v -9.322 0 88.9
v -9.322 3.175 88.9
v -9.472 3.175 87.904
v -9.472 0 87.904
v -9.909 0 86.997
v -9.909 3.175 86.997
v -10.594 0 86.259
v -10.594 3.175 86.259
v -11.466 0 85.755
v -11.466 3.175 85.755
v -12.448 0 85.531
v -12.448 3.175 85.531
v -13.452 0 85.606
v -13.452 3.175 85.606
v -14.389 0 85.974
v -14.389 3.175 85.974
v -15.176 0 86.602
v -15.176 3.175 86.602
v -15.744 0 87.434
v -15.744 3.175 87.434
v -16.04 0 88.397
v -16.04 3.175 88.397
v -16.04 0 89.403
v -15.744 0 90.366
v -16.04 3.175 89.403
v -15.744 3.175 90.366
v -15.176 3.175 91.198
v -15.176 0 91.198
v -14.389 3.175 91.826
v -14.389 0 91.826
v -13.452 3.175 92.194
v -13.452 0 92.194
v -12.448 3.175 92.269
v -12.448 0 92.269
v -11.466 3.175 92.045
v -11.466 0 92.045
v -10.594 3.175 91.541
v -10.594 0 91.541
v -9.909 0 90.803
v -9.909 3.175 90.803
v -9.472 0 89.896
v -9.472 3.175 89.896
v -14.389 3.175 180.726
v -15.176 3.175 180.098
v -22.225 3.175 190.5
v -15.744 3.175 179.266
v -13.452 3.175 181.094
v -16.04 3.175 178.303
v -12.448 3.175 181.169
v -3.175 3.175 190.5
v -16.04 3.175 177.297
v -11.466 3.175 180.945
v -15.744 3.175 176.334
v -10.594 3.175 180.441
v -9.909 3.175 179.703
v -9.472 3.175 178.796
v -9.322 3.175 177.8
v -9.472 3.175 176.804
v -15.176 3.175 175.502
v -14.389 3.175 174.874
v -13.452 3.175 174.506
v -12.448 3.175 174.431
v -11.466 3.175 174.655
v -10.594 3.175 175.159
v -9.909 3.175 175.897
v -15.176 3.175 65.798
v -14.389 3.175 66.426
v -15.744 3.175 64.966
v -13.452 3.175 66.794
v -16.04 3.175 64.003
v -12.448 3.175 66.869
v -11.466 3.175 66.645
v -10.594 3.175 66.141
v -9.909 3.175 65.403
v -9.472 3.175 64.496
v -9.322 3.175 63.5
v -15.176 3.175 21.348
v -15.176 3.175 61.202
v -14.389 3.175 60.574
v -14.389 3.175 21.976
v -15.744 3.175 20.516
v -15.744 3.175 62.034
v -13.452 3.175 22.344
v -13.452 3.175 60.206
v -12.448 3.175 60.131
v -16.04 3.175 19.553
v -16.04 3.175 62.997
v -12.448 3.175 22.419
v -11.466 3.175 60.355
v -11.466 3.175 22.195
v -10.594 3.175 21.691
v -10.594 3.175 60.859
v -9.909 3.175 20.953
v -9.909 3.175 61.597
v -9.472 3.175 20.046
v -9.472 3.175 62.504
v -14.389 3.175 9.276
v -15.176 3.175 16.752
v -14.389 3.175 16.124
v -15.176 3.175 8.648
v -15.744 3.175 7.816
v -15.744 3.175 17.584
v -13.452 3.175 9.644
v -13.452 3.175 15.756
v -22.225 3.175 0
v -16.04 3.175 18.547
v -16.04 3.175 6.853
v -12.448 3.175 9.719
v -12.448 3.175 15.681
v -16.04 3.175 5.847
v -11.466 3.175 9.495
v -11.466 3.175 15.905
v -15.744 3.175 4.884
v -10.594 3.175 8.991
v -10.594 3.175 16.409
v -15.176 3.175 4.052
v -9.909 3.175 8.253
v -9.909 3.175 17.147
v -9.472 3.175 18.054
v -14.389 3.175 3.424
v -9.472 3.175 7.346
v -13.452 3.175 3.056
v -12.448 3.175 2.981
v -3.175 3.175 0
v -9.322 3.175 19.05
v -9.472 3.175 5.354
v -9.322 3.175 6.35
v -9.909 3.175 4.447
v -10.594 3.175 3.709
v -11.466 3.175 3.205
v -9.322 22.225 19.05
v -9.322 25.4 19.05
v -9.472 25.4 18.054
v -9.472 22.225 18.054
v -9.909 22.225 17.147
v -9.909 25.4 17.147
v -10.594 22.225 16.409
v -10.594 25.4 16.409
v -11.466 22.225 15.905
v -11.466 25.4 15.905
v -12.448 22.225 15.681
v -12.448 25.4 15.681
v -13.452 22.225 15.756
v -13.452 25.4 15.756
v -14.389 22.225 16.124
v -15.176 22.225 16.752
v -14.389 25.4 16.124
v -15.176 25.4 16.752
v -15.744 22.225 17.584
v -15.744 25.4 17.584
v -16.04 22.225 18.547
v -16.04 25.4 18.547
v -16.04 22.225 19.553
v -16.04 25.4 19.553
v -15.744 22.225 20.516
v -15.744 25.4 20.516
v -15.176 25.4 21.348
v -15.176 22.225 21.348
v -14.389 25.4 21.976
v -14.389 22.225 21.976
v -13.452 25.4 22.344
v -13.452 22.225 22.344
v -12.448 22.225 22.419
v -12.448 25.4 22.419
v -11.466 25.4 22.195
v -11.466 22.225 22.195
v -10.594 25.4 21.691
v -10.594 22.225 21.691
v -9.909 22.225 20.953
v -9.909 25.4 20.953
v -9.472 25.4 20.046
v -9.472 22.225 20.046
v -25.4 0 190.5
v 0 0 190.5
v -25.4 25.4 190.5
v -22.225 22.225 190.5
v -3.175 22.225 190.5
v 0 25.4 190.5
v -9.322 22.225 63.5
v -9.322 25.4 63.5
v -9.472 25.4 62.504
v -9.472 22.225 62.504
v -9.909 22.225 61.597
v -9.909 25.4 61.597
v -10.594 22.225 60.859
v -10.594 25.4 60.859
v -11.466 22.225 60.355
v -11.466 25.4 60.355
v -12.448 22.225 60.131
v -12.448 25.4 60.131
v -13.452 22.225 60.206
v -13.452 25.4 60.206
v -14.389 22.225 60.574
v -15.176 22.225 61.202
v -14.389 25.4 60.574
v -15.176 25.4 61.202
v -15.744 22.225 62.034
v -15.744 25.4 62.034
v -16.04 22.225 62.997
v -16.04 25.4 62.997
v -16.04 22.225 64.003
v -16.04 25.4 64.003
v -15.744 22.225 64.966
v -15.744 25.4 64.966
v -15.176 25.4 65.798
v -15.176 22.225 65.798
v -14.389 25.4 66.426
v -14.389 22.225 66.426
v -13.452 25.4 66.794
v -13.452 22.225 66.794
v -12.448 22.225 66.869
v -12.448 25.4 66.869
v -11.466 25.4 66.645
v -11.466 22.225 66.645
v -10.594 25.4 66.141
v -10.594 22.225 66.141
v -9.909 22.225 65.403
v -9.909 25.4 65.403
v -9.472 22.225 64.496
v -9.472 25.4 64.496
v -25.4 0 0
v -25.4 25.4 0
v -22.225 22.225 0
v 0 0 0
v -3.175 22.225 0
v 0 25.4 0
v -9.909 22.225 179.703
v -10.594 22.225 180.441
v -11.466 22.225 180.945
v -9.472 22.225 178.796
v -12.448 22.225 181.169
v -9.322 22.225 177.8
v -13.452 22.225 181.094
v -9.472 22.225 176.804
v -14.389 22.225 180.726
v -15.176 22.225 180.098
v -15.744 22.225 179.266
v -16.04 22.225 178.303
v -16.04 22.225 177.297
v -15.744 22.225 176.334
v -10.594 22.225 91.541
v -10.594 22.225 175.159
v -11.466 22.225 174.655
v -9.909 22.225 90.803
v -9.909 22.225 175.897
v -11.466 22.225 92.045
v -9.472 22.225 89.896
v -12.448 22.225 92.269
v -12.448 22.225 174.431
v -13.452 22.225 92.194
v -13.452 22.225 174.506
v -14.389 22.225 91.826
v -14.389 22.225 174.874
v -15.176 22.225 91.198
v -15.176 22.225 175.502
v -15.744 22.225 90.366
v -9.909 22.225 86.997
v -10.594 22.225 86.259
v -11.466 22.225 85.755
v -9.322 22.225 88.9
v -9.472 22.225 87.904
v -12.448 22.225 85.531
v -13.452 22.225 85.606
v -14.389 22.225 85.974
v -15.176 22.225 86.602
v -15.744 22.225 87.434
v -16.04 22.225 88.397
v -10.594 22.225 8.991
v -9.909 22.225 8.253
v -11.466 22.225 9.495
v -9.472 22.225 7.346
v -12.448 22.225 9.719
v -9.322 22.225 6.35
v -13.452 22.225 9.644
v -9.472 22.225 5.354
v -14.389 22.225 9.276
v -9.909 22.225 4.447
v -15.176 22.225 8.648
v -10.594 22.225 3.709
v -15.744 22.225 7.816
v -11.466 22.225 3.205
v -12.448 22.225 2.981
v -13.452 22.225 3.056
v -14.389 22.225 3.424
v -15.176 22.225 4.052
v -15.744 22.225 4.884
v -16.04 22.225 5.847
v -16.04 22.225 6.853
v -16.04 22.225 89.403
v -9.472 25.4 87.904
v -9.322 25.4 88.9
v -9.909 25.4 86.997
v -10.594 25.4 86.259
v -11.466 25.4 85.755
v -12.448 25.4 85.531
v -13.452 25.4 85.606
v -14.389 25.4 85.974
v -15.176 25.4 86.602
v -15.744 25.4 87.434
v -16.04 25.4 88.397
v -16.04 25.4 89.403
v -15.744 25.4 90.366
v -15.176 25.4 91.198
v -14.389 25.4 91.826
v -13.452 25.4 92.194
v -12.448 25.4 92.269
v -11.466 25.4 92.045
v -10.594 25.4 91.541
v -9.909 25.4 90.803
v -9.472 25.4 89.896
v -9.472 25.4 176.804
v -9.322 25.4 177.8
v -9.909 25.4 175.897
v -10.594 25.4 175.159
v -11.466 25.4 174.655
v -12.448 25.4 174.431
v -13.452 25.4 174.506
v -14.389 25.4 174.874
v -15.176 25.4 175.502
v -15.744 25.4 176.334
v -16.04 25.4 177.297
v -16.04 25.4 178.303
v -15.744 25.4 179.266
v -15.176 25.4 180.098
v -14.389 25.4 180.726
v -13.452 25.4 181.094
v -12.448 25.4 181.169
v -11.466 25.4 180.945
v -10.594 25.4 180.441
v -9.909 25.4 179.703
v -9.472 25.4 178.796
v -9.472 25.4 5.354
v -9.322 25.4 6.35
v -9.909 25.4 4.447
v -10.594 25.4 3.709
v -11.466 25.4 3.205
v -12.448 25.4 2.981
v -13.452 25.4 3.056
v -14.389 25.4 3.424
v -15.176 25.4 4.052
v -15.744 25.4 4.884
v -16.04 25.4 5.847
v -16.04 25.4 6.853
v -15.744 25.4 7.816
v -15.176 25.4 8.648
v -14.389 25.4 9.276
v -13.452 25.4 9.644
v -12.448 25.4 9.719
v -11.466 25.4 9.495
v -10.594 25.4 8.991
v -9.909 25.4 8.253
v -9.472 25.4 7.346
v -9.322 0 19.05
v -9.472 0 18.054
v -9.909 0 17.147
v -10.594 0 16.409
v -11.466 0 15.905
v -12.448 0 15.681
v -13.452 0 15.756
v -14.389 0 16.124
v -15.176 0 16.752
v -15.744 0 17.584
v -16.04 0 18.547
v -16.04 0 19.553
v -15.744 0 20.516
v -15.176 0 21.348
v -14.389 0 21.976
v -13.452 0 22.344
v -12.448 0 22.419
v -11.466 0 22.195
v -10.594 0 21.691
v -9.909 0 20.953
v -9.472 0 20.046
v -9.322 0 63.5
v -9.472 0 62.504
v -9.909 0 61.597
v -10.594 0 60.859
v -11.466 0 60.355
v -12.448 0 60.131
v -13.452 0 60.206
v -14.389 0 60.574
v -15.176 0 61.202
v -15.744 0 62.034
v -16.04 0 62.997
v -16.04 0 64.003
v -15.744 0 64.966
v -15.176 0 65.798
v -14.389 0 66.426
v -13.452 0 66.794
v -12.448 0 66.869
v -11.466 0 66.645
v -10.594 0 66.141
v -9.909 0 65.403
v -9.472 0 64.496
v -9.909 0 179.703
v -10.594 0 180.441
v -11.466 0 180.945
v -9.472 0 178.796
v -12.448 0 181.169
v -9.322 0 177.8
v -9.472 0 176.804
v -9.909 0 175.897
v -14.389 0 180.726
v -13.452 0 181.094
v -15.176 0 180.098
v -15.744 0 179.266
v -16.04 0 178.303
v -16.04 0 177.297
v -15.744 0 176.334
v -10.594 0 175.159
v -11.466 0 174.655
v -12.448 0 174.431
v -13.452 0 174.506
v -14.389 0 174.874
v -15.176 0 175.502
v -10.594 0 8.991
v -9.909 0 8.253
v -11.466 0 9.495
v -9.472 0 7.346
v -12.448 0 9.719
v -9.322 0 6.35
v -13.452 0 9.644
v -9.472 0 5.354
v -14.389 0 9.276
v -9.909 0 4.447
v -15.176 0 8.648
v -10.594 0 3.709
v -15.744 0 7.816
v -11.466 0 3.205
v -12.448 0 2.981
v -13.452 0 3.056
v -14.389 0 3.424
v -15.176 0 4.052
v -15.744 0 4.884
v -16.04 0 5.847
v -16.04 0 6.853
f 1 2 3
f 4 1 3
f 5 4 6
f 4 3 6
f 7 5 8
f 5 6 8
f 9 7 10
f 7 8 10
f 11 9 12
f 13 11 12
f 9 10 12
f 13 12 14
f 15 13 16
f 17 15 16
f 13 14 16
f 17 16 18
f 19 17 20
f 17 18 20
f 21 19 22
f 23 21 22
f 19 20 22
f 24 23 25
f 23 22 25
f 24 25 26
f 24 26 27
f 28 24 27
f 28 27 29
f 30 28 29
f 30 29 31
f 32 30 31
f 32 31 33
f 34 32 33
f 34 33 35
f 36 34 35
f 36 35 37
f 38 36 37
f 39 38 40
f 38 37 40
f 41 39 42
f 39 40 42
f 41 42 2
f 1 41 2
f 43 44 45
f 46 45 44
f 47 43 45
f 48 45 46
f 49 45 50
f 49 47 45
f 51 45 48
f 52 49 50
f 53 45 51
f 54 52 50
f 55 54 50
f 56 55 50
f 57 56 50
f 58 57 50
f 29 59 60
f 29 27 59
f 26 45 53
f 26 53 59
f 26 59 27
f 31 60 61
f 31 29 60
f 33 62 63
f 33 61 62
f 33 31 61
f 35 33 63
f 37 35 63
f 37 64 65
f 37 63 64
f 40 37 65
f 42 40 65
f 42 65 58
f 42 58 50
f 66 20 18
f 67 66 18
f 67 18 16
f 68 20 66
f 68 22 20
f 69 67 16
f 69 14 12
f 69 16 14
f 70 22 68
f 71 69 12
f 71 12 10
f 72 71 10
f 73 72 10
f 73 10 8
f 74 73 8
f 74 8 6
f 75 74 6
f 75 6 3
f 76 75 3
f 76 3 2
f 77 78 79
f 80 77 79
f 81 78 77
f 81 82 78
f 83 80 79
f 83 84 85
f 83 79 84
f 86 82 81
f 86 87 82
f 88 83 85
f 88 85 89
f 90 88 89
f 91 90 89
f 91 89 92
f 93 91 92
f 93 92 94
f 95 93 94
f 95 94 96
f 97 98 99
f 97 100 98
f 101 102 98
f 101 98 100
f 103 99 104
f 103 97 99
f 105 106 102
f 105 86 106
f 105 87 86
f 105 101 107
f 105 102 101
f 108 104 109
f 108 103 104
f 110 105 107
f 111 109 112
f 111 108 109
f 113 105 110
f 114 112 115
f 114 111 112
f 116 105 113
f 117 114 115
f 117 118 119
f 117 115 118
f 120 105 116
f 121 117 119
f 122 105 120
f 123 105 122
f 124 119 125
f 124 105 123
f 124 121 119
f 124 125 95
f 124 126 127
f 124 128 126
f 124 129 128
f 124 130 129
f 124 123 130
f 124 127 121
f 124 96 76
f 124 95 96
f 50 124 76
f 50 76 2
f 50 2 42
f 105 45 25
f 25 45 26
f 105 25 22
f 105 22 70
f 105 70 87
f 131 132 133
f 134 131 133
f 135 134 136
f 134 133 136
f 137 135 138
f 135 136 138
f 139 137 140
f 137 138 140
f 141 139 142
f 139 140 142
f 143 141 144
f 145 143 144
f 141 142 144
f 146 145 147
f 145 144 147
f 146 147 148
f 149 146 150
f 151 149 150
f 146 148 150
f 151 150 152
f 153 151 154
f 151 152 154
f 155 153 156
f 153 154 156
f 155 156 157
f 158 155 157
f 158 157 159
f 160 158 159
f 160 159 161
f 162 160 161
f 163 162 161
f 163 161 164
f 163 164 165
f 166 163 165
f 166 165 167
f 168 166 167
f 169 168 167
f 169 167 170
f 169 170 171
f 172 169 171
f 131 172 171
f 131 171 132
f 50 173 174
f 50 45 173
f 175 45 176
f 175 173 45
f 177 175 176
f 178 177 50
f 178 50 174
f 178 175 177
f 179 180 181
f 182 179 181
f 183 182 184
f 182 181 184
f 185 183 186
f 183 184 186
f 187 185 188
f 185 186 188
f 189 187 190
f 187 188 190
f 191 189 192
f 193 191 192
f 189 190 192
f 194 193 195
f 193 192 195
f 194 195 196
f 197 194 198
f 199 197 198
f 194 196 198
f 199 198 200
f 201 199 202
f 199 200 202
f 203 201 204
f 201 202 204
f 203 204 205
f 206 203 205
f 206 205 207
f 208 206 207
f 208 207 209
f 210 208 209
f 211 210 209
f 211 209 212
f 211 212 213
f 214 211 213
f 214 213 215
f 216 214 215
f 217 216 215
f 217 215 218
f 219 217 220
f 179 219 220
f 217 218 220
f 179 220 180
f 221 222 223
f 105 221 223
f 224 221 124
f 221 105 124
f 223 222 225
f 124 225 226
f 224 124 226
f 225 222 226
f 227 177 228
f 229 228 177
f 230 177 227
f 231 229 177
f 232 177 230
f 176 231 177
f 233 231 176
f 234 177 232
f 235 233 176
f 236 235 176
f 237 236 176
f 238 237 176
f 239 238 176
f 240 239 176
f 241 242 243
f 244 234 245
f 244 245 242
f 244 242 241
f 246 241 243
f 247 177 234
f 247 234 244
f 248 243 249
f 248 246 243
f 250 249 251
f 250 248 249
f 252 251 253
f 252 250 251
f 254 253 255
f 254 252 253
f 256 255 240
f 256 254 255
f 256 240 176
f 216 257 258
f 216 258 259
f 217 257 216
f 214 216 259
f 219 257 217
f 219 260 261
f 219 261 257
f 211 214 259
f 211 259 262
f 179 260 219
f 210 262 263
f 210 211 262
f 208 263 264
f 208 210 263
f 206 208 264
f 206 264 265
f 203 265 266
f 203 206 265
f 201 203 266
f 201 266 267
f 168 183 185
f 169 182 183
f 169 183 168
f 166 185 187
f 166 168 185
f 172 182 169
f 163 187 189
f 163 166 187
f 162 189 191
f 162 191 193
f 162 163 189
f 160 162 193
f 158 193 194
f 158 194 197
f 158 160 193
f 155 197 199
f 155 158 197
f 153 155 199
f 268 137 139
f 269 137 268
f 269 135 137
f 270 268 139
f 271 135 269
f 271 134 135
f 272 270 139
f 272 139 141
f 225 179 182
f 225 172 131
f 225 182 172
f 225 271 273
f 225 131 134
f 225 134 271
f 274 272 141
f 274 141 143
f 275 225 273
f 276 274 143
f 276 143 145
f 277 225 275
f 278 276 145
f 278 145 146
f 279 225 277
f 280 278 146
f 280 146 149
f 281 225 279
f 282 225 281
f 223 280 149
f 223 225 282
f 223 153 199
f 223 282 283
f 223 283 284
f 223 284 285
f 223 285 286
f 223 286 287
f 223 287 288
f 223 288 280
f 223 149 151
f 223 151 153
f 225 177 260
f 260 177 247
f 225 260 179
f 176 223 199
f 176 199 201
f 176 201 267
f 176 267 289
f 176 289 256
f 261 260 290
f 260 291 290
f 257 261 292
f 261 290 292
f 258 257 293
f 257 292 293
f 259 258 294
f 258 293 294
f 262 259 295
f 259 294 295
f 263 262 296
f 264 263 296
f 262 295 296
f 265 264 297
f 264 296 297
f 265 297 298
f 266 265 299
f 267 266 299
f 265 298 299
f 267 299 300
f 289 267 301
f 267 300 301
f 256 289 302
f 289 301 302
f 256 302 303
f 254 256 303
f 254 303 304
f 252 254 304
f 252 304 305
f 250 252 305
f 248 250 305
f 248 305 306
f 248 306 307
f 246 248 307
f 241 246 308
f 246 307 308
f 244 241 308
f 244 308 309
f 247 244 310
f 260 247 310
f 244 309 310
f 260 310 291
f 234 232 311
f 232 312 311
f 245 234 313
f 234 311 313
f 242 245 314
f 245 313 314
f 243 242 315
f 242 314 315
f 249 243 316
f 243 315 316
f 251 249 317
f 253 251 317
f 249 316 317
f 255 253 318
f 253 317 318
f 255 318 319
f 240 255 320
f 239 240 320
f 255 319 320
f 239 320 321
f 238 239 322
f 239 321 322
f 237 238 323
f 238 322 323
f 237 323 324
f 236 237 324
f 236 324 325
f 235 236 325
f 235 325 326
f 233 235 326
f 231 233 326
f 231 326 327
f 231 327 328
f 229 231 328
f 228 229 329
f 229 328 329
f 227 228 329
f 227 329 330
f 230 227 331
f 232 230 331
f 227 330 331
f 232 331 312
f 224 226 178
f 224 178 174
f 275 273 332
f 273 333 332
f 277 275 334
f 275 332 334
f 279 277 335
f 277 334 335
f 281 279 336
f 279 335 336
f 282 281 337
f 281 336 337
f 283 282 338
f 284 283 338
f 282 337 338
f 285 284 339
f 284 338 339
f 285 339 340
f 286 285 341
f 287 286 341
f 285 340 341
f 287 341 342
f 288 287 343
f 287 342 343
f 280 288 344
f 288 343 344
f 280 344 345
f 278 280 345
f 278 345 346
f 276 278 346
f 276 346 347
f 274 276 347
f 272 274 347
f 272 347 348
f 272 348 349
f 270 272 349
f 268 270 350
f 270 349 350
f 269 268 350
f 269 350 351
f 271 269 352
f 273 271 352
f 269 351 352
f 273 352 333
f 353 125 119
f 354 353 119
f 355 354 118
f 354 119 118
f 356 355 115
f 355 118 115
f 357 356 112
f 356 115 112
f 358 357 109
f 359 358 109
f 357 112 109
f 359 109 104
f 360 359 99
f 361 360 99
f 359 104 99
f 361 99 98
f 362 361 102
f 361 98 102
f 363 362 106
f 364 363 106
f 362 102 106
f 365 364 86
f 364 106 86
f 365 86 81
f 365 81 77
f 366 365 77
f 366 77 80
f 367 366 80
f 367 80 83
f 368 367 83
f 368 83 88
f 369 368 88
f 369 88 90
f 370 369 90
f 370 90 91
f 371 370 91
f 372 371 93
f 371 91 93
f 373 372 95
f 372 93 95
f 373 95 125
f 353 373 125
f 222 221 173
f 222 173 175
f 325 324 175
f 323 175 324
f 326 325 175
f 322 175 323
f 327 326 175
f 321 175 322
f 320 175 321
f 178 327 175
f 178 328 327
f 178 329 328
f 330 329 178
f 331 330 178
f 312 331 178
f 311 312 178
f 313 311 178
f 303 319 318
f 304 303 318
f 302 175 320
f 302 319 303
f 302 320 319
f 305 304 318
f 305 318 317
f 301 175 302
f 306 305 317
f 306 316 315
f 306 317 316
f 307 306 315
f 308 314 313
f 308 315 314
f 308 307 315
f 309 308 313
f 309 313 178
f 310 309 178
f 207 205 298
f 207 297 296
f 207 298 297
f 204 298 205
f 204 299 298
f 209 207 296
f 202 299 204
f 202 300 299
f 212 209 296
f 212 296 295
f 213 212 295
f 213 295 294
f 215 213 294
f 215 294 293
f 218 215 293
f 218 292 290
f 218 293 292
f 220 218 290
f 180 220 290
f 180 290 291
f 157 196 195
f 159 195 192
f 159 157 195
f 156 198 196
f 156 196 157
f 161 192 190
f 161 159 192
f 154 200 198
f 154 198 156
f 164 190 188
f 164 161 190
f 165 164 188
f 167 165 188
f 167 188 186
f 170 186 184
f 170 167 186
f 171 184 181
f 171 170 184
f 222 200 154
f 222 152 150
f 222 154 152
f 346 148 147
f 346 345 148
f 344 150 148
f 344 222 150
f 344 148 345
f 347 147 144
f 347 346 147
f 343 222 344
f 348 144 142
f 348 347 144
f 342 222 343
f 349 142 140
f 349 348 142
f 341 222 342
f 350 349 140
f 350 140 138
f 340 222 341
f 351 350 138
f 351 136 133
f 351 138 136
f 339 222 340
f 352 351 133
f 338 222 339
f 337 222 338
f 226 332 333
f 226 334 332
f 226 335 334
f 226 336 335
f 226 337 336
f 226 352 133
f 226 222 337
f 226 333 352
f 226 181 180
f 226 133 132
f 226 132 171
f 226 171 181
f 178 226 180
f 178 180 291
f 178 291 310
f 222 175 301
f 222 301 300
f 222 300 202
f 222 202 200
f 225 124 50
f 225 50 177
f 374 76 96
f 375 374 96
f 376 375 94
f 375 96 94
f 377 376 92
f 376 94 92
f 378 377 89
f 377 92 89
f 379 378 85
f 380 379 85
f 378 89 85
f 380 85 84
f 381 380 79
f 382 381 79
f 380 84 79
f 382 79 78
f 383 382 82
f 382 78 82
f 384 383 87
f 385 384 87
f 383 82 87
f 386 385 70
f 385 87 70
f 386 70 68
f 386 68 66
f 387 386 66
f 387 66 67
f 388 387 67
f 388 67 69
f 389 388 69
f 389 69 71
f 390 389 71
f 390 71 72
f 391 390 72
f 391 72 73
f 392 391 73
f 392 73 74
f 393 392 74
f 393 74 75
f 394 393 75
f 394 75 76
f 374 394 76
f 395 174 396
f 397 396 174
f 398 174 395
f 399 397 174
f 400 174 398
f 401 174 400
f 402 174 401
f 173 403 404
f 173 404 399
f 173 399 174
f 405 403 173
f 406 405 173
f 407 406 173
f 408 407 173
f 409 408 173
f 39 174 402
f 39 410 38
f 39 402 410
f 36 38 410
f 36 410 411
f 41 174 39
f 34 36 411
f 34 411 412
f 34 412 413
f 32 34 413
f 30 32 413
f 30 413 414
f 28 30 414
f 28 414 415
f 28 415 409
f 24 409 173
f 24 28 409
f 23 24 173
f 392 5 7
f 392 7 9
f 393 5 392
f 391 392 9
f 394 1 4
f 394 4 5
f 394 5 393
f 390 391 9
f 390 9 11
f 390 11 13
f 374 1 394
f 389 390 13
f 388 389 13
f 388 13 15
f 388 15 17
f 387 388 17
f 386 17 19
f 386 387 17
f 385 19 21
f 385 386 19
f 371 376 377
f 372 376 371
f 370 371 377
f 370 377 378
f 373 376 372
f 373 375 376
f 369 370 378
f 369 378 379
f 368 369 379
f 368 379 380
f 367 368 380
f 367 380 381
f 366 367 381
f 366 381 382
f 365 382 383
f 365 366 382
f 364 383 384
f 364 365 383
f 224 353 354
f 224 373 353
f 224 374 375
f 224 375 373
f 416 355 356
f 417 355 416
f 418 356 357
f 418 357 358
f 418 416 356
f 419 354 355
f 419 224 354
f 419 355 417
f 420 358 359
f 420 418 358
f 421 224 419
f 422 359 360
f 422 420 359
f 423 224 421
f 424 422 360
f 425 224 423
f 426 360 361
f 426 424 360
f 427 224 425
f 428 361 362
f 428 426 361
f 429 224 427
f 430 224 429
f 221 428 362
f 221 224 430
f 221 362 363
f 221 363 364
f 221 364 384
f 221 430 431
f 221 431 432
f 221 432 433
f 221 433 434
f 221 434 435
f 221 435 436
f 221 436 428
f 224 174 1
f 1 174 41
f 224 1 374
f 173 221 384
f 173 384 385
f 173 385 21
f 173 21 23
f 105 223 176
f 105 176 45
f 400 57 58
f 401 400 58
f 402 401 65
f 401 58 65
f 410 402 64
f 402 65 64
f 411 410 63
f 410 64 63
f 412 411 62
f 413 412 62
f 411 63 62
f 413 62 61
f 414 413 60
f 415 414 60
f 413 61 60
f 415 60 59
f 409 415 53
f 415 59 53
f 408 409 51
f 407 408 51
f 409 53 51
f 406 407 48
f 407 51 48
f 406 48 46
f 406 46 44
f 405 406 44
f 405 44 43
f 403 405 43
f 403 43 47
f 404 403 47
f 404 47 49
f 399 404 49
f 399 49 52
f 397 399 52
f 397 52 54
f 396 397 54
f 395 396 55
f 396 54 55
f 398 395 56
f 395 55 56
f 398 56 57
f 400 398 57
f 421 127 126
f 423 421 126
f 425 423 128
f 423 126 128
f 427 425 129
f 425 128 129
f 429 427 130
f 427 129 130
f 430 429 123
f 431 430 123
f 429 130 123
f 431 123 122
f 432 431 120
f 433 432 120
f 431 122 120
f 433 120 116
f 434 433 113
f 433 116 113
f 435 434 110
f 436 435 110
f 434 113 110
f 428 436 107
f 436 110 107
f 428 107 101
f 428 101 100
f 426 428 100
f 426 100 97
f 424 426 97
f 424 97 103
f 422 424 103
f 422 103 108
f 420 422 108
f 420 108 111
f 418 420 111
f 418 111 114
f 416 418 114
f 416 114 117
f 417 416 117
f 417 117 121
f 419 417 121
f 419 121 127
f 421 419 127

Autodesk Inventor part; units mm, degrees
ref_plane "YZ Plane" through (0, 0, 0) normal (1, 0, 0) x (0, 1, 0)
ref_plane "XZ Plane" through (0, 0, 0) normal (0, 1, 0) x (-1, 0, 0)
ref_plane "XY Plane" through (0, 0, 0) normal (0, 0, 1) x (1, 0, 0)
sketch "Sketch1" plane through (0, 0, 0) normal (0, 0, 1) x (1, 0, 0)
  line L0 (0, 0) -> (-25.4, 0)
  line L1 (-25.4, 0) -> (-25.4, 25.4)
  line L2 (-25.4, 25.4) -> (0, 25.4)
  line L3 (0, 25.4) -> (0, 0)
  line L4 (-3.175, 22.225) -> (-22.225, 22.225)
  line L5 (-22.225, 22.225) -> (-22.225, 3.175)
  line L6 (-22.225, 3.175) -> (-3.175, 3.175)
  line L7 (-3.175, 3.175) -> (-3.175, 22.225)
  dimension "d0" = 25.4
  dimension "d2" = 25.4
  dimension "d3" = 3.175
extrude "Extrusion1" add sketch "Sketch1" along normal blind 190.5
sketch "Sketch2" plane through (-25.4, 25.4, 0) normal (0, 1, 0) x (1, 0, 0)
  circle A0 centre (12.7, -19.05) radius 3.3782 projected
  circle A1 centre (12.7, -6.35) radius 3.3782 projected
extrude "Extrusion2" cut sketch "Sketch2" against normal blind 25.4
sketch "Sketch3" plane through (-25.4, 25.4, 0) normal (0, 1, 0) x (1, 0, 0)
  circle A0 centre (12.7, -203.2) radius 3.3782 projected
  circle A1 centre (12.7, -177.8) radius 3.3782 projected
extrude "Extrusion3" cut sketch "Sketch3" against normal blind 25.4
sketch "Sketch4" plane through (-25.4, 25.4, 0) normal (0, 1, 0) x (1, 0, 0)
  circle A0 centre (12.7, -63.5) radius 3.3782
  circle A1 centre (12.7, -88.9) radius 3.3782
extrude "Extrusion4" cut sketch "Sketch4" against normal blind 25.4
properties part number "p80 mount" material "Aluminum 6061"
